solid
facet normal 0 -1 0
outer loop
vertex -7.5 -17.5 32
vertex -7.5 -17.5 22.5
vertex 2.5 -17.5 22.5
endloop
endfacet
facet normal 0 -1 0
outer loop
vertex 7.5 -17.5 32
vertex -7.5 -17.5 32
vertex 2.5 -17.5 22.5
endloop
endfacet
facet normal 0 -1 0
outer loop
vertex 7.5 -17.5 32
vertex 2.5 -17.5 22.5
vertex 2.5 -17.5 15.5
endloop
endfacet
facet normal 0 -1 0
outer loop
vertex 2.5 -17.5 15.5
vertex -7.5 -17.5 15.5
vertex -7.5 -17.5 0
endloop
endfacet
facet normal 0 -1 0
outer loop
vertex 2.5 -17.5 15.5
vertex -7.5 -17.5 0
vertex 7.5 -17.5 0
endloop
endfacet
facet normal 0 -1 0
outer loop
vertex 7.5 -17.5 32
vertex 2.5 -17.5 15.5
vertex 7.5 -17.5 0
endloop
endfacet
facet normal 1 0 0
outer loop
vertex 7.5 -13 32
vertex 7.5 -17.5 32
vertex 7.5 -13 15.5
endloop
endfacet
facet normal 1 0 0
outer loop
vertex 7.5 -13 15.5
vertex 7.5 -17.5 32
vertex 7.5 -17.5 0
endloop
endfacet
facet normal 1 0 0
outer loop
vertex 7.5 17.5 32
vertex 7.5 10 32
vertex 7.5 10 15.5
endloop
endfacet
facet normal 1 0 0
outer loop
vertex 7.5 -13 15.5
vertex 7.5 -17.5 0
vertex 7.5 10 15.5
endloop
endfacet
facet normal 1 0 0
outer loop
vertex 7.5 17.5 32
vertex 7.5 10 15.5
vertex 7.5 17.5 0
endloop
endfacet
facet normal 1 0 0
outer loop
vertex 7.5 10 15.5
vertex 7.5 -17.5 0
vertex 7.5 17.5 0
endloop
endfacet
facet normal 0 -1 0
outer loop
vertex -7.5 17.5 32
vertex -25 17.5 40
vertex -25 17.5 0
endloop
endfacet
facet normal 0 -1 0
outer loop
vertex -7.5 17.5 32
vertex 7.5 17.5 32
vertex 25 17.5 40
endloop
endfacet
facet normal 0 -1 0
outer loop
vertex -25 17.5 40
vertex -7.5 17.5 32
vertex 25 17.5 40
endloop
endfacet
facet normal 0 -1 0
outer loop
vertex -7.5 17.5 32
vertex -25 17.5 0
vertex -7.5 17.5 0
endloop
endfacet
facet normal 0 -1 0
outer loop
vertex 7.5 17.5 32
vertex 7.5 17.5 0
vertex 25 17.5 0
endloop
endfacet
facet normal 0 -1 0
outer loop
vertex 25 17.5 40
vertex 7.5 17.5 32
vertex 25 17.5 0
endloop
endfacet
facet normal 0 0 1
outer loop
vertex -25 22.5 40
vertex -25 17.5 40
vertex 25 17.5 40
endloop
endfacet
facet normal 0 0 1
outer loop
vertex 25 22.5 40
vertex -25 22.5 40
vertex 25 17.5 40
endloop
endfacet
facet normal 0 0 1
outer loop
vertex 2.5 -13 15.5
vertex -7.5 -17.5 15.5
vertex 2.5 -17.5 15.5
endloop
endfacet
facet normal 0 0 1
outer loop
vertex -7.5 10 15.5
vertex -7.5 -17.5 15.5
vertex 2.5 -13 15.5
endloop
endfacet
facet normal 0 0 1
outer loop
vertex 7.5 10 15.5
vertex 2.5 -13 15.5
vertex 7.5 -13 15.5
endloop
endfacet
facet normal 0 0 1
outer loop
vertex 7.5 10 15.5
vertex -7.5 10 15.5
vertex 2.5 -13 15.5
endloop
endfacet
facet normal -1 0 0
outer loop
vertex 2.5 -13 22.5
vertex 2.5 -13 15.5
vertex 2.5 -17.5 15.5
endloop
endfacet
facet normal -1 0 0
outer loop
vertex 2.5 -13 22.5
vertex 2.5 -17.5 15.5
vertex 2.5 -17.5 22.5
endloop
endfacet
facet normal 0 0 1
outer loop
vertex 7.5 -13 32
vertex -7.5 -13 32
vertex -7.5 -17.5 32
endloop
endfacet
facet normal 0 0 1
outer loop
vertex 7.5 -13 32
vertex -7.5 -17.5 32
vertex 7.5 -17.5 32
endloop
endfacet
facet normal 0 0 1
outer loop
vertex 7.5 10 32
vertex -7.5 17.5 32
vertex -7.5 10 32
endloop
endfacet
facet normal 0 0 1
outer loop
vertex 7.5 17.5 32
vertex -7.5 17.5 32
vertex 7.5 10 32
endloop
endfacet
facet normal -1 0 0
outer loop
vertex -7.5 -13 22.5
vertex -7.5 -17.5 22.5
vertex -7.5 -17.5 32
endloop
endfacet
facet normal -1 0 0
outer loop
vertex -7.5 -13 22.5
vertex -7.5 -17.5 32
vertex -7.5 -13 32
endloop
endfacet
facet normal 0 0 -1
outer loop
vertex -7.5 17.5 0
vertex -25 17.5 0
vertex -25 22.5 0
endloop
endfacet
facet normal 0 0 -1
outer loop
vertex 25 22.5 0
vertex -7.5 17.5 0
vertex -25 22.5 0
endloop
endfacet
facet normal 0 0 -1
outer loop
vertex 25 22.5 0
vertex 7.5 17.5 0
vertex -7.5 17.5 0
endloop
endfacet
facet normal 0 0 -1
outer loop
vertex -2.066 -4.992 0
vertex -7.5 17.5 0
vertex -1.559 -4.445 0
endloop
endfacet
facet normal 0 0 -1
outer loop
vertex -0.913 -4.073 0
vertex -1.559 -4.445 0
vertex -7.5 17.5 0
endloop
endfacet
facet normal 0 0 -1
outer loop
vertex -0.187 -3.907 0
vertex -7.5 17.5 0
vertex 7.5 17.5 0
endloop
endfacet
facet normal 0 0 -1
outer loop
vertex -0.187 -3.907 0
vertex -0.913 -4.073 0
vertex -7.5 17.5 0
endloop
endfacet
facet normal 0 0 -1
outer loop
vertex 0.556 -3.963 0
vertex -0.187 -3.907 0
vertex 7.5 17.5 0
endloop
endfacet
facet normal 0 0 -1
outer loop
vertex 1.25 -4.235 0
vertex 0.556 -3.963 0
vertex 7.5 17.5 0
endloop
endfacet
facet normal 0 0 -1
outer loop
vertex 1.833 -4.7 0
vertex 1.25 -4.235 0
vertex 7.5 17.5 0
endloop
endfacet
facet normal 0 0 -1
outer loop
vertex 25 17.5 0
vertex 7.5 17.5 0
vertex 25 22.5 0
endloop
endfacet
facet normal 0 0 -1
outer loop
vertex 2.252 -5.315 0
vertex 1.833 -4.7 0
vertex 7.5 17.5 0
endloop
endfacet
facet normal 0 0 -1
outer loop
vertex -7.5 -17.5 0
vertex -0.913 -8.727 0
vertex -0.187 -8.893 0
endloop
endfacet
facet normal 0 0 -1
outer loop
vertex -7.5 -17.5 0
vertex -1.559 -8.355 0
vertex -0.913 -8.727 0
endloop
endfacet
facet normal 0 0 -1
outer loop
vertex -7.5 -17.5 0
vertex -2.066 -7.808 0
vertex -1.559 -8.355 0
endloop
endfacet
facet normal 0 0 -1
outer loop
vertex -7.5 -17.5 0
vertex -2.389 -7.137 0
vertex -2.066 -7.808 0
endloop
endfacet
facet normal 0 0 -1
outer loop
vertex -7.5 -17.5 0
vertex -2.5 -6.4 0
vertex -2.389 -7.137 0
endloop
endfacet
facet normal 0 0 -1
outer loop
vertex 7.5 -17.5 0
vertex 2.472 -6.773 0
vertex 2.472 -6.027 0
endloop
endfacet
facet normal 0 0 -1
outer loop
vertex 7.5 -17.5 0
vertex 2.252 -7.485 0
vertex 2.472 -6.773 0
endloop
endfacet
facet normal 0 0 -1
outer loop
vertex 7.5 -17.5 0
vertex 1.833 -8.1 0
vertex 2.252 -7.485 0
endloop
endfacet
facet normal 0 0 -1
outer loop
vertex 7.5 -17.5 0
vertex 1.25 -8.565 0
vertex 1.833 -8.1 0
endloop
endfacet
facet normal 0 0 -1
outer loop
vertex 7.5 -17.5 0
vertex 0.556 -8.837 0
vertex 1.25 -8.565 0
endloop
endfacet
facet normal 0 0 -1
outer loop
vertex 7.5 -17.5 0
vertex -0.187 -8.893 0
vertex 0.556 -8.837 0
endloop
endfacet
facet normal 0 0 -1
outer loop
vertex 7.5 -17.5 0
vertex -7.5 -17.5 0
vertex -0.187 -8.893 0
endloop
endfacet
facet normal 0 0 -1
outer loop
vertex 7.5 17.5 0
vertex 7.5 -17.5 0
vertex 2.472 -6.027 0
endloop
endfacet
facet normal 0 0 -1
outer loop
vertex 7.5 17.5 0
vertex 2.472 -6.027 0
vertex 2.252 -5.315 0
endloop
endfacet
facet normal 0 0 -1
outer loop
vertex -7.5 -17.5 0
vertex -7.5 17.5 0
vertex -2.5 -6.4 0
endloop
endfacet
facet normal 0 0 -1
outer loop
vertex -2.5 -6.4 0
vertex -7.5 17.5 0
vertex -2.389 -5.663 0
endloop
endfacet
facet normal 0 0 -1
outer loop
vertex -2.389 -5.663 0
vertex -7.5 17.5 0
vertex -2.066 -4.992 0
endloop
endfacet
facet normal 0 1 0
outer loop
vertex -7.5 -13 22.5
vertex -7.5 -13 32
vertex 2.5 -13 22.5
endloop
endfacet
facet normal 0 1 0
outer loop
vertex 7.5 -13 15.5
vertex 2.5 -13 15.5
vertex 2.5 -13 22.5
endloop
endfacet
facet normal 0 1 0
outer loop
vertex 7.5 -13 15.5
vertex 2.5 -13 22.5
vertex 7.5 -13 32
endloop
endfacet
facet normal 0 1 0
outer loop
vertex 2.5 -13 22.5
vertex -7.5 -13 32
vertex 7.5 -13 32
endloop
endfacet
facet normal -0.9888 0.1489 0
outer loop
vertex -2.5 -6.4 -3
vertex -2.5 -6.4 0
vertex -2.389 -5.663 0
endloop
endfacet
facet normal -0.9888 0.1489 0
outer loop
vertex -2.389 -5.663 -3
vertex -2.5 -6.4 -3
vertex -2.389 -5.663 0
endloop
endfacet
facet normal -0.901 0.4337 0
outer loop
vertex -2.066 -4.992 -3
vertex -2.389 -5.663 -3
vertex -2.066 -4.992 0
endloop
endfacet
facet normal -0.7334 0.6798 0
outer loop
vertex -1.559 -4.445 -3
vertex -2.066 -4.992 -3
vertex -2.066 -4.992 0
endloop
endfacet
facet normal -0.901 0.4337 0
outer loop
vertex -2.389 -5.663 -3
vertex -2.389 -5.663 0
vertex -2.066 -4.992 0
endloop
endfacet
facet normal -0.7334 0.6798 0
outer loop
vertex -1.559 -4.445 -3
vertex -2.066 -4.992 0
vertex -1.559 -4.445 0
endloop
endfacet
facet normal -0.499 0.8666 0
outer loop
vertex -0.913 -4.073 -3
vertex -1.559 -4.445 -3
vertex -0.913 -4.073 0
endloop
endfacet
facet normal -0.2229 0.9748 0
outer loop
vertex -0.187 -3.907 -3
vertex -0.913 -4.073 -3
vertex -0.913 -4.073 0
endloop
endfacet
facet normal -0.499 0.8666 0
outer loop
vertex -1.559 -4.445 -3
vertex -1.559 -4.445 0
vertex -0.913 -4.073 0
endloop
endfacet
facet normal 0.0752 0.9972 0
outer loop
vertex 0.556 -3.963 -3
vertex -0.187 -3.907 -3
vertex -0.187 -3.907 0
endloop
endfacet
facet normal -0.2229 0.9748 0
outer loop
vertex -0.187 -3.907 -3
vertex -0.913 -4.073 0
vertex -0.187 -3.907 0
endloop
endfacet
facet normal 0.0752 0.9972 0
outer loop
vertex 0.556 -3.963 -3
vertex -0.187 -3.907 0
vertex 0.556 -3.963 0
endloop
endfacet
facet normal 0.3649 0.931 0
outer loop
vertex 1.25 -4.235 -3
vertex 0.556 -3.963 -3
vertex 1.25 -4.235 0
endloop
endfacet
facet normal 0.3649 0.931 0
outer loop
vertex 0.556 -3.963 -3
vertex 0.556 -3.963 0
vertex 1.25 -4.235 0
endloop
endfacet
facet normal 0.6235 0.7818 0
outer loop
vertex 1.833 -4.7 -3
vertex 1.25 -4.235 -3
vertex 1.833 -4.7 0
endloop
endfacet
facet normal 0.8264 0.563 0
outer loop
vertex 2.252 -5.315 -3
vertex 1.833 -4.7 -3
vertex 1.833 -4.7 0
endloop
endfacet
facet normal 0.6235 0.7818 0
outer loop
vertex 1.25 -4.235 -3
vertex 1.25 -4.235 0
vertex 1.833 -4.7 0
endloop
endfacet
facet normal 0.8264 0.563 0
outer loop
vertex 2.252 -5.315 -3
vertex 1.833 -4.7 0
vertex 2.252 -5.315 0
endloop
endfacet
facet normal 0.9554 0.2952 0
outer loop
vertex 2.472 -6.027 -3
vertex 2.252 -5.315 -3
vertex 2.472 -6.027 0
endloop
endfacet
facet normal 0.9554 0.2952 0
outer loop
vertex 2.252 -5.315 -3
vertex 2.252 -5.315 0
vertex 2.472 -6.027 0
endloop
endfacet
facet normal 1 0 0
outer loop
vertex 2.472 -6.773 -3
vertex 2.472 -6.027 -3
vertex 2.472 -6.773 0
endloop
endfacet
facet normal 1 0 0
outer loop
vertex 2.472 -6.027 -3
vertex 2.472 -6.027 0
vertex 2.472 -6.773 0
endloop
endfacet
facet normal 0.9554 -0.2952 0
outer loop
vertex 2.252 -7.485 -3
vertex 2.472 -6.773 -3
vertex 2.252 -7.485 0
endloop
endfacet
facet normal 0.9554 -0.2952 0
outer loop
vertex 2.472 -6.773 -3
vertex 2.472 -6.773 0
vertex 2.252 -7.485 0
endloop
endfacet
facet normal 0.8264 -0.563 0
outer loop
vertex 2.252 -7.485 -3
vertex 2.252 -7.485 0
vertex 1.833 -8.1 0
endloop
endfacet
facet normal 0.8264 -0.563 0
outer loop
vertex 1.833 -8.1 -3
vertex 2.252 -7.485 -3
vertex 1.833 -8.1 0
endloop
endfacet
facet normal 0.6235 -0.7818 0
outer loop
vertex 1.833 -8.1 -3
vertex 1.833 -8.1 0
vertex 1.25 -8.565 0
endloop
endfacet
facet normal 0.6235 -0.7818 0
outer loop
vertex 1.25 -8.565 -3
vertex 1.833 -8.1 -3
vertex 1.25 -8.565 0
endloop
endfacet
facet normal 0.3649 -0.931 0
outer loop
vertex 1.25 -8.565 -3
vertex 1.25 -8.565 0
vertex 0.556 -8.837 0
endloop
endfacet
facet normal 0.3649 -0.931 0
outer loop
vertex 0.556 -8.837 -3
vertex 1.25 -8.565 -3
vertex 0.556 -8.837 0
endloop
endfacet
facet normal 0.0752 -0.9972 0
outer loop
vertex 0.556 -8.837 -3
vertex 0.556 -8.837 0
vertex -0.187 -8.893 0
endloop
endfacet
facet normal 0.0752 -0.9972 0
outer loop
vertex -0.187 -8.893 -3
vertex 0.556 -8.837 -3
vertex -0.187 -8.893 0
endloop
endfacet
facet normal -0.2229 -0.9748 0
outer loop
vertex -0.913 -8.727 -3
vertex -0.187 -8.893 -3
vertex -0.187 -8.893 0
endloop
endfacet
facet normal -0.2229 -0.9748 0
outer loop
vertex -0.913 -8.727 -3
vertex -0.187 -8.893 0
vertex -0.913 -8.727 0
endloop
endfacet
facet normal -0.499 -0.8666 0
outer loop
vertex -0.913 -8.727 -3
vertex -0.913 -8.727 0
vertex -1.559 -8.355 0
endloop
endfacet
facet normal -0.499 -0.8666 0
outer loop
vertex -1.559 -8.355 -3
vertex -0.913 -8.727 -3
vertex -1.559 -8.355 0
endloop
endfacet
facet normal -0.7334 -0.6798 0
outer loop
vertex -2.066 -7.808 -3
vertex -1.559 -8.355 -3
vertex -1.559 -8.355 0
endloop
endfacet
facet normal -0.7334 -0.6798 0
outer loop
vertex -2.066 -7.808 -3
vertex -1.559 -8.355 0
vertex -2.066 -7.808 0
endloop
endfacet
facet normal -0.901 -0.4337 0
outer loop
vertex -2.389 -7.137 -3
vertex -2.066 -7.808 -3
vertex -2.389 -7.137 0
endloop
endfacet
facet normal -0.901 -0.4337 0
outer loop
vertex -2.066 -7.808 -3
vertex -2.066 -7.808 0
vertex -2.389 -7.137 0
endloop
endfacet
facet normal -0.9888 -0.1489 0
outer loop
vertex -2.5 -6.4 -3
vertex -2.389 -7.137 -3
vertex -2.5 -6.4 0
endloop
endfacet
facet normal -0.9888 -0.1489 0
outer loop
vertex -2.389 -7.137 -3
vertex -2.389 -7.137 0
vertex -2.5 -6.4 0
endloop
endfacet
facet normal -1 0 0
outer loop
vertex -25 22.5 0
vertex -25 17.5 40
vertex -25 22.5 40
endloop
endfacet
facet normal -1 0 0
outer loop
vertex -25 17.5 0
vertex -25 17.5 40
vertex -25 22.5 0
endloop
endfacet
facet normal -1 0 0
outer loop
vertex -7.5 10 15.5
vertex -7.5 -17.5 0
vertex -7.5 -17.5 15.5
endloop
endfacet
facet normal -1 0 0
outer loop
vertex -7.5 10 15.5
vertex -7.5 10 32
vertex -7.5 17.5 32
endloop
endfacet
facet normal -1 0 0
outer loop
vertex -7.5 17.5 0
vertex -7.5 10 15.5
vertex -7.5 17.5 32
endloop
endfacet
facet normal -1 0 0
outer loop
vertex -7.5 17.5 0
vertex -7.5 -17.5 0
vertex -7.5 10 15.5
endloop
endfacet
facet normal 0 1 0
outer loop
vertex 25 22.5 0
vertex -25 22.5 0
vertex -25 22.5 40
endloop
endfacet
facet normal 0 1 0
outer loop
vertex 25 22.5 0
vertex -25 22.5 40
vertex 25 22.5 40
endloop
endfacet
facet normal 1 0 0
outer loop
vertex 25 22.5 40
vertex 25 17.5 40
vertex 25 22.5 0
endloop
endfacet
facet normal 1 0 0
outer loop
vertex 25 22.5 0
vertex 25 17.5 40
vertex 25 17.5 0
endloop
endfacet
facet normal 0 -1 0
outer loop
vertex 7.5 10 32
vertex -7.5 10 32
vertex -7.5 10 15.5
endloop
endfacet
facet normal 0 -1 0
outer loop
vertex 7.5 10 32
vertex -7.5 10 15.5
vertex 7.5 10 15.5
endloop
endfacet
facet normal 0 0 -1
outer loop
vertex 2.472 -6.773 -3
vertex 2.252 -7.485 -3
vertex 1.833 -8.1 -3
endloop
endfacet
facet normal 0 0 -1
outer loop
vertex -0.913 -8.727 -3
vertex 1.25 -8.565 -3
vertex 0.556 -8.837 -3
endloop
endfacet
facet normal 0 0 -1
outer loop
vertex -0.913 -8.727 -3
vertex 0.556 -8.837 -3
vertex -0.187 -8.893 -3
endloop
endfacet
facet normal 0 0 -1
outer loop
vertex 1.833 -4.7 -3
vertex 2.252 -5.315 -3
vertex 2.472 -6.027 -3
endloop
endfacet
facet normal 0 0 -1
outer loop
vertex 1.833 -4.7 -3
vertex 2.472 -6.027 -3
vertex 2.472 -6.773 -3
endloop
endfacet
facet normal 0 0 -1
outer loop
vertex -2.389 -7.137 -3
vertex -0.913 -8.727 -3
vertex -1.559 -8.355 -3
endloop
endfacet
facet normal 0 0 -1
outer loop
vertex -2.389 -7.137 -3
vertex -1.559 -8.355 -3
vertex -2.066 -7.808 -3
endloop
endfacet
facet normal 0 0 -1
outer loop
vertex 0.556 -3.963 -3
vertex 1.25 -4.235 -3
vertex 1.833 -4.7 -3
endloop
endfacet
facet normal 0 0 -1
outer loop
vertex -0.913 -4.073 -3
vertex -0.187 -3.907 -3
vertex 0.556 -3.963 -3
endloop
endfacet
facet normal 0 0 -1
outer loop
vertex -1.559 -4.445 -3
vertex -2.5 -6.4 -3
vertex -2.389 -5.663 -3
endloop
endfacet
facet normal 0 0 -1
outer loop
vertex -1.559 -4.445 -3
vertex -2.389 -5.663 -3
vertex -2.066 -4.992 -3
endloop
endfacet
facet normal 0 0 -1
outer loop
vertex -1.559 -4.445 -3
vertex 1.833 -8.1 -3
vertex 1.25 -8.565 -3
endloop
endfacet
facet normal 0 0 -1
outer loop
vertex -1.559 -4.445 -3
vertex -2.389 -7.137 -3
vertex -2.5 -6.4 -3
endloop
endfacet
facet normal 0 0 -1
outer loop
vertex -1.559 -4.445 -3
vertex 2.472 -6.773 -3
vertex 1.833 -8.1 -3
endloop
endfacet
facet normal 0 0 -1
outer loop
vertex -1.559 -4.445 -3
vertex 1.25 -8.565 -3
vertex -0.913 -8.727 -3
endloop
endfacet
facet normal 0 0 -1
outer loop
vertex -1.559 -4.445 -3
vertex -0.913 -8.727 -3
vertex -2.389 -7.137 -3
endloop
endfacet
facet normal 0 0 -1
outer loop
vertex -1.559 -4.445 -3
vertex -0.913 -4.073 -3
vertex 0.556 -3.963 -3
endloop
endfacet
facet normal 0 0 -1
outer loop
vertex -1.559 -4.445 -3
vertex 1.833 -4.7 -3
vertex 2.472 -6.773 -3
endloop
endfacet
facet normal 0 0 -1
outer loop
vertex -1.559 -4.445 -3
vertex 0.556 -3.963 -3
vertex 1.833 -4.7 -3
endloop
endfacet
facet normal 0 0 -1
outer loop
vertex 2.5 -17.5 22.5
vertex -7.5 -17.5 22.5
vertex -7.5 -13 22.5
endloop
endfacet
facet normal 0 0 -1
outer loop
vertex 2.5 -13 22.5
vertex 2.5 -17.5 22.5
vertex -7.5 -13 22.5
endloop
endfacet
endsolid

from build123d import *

# Parameters (mm, degrees)
SKETCH1_W           = 15
SKETCH1_H           = 35
BOSS_EXTRUDE1_DEPTH = 32
SKETCH4_W           = 15
SKETCH4_H           = 23
CUT_EXTRUDE2_DEPTH  = 16.5
SKETCH7_R           = 2.5
BOSS_EXTRUDE2_DEPTH = 3
SKETCH9_W           = 50
SKETCH9_H           = 40
BOSS_EXTRUDE3_DEPTH = 5
SKETCH10_W          = 7
SKETCH10_H          = 4.5
CUT_EXTRUDE3_DEPTH  = 10


with BuildPart() as part:
    # Sketch1 → Boss-Extrude1 (new body)
    with BuildSketch(Plane.XY):
        Rectangle(SKETCH1_W, SKETCH1_H)
    extrude(amount=BOSS_EXTRUDE1_DEPTH)

    # Sketch4 → Cut-Extrude2 (cut)
    with BuildSketch(Plane.XY.offset(32)):
        with Locations((0, -1.5)):
            Rectangle(SKETCH4_W, SKETCH4_H)
    extrude(amount=-CUT_EXTRUDE2_DEPTH, mode=Mode.SUBTRACT)

    # Sketch7 → Boss-Extrude2 (add)
    with BuildSketch(Plane(origin=(0, 0, 0), x_dir=(-1, 0, 0), z_dir=(0, 0, -1))):
        with Locations((0, -6.4)):
            Circle(SKETCH7_R)
    extrude(amount=BOSS_EXTRUDE2_DEPTH)

    # Sketch9 → Boss-Extrude3 (add)
    with BuildSketch(Plane(origin=(0, 17.5, 0), x_dir=(1, 0, 0), z_dir=(0, 1, 0))):
        with Locations((0, -20)):
            Rectangle(SKETCH9_W, SKETCH9_H)
    extrude(amount=BOSS_EXTRUDE3_DEPTH)

    # Sketch10 → Cut-Extrude3 (cut)
    with BuildSketch(Plane.ZY.offset(7.5)):
        with Locations((19, -15.25)):
            Rectangle(SKETCH10_W, SKETCH10_H)
    extrude(amount=-CUT_EXTRUDE3_DEPTH, mode=Mode.SUBTRACT)


solid = part.part
